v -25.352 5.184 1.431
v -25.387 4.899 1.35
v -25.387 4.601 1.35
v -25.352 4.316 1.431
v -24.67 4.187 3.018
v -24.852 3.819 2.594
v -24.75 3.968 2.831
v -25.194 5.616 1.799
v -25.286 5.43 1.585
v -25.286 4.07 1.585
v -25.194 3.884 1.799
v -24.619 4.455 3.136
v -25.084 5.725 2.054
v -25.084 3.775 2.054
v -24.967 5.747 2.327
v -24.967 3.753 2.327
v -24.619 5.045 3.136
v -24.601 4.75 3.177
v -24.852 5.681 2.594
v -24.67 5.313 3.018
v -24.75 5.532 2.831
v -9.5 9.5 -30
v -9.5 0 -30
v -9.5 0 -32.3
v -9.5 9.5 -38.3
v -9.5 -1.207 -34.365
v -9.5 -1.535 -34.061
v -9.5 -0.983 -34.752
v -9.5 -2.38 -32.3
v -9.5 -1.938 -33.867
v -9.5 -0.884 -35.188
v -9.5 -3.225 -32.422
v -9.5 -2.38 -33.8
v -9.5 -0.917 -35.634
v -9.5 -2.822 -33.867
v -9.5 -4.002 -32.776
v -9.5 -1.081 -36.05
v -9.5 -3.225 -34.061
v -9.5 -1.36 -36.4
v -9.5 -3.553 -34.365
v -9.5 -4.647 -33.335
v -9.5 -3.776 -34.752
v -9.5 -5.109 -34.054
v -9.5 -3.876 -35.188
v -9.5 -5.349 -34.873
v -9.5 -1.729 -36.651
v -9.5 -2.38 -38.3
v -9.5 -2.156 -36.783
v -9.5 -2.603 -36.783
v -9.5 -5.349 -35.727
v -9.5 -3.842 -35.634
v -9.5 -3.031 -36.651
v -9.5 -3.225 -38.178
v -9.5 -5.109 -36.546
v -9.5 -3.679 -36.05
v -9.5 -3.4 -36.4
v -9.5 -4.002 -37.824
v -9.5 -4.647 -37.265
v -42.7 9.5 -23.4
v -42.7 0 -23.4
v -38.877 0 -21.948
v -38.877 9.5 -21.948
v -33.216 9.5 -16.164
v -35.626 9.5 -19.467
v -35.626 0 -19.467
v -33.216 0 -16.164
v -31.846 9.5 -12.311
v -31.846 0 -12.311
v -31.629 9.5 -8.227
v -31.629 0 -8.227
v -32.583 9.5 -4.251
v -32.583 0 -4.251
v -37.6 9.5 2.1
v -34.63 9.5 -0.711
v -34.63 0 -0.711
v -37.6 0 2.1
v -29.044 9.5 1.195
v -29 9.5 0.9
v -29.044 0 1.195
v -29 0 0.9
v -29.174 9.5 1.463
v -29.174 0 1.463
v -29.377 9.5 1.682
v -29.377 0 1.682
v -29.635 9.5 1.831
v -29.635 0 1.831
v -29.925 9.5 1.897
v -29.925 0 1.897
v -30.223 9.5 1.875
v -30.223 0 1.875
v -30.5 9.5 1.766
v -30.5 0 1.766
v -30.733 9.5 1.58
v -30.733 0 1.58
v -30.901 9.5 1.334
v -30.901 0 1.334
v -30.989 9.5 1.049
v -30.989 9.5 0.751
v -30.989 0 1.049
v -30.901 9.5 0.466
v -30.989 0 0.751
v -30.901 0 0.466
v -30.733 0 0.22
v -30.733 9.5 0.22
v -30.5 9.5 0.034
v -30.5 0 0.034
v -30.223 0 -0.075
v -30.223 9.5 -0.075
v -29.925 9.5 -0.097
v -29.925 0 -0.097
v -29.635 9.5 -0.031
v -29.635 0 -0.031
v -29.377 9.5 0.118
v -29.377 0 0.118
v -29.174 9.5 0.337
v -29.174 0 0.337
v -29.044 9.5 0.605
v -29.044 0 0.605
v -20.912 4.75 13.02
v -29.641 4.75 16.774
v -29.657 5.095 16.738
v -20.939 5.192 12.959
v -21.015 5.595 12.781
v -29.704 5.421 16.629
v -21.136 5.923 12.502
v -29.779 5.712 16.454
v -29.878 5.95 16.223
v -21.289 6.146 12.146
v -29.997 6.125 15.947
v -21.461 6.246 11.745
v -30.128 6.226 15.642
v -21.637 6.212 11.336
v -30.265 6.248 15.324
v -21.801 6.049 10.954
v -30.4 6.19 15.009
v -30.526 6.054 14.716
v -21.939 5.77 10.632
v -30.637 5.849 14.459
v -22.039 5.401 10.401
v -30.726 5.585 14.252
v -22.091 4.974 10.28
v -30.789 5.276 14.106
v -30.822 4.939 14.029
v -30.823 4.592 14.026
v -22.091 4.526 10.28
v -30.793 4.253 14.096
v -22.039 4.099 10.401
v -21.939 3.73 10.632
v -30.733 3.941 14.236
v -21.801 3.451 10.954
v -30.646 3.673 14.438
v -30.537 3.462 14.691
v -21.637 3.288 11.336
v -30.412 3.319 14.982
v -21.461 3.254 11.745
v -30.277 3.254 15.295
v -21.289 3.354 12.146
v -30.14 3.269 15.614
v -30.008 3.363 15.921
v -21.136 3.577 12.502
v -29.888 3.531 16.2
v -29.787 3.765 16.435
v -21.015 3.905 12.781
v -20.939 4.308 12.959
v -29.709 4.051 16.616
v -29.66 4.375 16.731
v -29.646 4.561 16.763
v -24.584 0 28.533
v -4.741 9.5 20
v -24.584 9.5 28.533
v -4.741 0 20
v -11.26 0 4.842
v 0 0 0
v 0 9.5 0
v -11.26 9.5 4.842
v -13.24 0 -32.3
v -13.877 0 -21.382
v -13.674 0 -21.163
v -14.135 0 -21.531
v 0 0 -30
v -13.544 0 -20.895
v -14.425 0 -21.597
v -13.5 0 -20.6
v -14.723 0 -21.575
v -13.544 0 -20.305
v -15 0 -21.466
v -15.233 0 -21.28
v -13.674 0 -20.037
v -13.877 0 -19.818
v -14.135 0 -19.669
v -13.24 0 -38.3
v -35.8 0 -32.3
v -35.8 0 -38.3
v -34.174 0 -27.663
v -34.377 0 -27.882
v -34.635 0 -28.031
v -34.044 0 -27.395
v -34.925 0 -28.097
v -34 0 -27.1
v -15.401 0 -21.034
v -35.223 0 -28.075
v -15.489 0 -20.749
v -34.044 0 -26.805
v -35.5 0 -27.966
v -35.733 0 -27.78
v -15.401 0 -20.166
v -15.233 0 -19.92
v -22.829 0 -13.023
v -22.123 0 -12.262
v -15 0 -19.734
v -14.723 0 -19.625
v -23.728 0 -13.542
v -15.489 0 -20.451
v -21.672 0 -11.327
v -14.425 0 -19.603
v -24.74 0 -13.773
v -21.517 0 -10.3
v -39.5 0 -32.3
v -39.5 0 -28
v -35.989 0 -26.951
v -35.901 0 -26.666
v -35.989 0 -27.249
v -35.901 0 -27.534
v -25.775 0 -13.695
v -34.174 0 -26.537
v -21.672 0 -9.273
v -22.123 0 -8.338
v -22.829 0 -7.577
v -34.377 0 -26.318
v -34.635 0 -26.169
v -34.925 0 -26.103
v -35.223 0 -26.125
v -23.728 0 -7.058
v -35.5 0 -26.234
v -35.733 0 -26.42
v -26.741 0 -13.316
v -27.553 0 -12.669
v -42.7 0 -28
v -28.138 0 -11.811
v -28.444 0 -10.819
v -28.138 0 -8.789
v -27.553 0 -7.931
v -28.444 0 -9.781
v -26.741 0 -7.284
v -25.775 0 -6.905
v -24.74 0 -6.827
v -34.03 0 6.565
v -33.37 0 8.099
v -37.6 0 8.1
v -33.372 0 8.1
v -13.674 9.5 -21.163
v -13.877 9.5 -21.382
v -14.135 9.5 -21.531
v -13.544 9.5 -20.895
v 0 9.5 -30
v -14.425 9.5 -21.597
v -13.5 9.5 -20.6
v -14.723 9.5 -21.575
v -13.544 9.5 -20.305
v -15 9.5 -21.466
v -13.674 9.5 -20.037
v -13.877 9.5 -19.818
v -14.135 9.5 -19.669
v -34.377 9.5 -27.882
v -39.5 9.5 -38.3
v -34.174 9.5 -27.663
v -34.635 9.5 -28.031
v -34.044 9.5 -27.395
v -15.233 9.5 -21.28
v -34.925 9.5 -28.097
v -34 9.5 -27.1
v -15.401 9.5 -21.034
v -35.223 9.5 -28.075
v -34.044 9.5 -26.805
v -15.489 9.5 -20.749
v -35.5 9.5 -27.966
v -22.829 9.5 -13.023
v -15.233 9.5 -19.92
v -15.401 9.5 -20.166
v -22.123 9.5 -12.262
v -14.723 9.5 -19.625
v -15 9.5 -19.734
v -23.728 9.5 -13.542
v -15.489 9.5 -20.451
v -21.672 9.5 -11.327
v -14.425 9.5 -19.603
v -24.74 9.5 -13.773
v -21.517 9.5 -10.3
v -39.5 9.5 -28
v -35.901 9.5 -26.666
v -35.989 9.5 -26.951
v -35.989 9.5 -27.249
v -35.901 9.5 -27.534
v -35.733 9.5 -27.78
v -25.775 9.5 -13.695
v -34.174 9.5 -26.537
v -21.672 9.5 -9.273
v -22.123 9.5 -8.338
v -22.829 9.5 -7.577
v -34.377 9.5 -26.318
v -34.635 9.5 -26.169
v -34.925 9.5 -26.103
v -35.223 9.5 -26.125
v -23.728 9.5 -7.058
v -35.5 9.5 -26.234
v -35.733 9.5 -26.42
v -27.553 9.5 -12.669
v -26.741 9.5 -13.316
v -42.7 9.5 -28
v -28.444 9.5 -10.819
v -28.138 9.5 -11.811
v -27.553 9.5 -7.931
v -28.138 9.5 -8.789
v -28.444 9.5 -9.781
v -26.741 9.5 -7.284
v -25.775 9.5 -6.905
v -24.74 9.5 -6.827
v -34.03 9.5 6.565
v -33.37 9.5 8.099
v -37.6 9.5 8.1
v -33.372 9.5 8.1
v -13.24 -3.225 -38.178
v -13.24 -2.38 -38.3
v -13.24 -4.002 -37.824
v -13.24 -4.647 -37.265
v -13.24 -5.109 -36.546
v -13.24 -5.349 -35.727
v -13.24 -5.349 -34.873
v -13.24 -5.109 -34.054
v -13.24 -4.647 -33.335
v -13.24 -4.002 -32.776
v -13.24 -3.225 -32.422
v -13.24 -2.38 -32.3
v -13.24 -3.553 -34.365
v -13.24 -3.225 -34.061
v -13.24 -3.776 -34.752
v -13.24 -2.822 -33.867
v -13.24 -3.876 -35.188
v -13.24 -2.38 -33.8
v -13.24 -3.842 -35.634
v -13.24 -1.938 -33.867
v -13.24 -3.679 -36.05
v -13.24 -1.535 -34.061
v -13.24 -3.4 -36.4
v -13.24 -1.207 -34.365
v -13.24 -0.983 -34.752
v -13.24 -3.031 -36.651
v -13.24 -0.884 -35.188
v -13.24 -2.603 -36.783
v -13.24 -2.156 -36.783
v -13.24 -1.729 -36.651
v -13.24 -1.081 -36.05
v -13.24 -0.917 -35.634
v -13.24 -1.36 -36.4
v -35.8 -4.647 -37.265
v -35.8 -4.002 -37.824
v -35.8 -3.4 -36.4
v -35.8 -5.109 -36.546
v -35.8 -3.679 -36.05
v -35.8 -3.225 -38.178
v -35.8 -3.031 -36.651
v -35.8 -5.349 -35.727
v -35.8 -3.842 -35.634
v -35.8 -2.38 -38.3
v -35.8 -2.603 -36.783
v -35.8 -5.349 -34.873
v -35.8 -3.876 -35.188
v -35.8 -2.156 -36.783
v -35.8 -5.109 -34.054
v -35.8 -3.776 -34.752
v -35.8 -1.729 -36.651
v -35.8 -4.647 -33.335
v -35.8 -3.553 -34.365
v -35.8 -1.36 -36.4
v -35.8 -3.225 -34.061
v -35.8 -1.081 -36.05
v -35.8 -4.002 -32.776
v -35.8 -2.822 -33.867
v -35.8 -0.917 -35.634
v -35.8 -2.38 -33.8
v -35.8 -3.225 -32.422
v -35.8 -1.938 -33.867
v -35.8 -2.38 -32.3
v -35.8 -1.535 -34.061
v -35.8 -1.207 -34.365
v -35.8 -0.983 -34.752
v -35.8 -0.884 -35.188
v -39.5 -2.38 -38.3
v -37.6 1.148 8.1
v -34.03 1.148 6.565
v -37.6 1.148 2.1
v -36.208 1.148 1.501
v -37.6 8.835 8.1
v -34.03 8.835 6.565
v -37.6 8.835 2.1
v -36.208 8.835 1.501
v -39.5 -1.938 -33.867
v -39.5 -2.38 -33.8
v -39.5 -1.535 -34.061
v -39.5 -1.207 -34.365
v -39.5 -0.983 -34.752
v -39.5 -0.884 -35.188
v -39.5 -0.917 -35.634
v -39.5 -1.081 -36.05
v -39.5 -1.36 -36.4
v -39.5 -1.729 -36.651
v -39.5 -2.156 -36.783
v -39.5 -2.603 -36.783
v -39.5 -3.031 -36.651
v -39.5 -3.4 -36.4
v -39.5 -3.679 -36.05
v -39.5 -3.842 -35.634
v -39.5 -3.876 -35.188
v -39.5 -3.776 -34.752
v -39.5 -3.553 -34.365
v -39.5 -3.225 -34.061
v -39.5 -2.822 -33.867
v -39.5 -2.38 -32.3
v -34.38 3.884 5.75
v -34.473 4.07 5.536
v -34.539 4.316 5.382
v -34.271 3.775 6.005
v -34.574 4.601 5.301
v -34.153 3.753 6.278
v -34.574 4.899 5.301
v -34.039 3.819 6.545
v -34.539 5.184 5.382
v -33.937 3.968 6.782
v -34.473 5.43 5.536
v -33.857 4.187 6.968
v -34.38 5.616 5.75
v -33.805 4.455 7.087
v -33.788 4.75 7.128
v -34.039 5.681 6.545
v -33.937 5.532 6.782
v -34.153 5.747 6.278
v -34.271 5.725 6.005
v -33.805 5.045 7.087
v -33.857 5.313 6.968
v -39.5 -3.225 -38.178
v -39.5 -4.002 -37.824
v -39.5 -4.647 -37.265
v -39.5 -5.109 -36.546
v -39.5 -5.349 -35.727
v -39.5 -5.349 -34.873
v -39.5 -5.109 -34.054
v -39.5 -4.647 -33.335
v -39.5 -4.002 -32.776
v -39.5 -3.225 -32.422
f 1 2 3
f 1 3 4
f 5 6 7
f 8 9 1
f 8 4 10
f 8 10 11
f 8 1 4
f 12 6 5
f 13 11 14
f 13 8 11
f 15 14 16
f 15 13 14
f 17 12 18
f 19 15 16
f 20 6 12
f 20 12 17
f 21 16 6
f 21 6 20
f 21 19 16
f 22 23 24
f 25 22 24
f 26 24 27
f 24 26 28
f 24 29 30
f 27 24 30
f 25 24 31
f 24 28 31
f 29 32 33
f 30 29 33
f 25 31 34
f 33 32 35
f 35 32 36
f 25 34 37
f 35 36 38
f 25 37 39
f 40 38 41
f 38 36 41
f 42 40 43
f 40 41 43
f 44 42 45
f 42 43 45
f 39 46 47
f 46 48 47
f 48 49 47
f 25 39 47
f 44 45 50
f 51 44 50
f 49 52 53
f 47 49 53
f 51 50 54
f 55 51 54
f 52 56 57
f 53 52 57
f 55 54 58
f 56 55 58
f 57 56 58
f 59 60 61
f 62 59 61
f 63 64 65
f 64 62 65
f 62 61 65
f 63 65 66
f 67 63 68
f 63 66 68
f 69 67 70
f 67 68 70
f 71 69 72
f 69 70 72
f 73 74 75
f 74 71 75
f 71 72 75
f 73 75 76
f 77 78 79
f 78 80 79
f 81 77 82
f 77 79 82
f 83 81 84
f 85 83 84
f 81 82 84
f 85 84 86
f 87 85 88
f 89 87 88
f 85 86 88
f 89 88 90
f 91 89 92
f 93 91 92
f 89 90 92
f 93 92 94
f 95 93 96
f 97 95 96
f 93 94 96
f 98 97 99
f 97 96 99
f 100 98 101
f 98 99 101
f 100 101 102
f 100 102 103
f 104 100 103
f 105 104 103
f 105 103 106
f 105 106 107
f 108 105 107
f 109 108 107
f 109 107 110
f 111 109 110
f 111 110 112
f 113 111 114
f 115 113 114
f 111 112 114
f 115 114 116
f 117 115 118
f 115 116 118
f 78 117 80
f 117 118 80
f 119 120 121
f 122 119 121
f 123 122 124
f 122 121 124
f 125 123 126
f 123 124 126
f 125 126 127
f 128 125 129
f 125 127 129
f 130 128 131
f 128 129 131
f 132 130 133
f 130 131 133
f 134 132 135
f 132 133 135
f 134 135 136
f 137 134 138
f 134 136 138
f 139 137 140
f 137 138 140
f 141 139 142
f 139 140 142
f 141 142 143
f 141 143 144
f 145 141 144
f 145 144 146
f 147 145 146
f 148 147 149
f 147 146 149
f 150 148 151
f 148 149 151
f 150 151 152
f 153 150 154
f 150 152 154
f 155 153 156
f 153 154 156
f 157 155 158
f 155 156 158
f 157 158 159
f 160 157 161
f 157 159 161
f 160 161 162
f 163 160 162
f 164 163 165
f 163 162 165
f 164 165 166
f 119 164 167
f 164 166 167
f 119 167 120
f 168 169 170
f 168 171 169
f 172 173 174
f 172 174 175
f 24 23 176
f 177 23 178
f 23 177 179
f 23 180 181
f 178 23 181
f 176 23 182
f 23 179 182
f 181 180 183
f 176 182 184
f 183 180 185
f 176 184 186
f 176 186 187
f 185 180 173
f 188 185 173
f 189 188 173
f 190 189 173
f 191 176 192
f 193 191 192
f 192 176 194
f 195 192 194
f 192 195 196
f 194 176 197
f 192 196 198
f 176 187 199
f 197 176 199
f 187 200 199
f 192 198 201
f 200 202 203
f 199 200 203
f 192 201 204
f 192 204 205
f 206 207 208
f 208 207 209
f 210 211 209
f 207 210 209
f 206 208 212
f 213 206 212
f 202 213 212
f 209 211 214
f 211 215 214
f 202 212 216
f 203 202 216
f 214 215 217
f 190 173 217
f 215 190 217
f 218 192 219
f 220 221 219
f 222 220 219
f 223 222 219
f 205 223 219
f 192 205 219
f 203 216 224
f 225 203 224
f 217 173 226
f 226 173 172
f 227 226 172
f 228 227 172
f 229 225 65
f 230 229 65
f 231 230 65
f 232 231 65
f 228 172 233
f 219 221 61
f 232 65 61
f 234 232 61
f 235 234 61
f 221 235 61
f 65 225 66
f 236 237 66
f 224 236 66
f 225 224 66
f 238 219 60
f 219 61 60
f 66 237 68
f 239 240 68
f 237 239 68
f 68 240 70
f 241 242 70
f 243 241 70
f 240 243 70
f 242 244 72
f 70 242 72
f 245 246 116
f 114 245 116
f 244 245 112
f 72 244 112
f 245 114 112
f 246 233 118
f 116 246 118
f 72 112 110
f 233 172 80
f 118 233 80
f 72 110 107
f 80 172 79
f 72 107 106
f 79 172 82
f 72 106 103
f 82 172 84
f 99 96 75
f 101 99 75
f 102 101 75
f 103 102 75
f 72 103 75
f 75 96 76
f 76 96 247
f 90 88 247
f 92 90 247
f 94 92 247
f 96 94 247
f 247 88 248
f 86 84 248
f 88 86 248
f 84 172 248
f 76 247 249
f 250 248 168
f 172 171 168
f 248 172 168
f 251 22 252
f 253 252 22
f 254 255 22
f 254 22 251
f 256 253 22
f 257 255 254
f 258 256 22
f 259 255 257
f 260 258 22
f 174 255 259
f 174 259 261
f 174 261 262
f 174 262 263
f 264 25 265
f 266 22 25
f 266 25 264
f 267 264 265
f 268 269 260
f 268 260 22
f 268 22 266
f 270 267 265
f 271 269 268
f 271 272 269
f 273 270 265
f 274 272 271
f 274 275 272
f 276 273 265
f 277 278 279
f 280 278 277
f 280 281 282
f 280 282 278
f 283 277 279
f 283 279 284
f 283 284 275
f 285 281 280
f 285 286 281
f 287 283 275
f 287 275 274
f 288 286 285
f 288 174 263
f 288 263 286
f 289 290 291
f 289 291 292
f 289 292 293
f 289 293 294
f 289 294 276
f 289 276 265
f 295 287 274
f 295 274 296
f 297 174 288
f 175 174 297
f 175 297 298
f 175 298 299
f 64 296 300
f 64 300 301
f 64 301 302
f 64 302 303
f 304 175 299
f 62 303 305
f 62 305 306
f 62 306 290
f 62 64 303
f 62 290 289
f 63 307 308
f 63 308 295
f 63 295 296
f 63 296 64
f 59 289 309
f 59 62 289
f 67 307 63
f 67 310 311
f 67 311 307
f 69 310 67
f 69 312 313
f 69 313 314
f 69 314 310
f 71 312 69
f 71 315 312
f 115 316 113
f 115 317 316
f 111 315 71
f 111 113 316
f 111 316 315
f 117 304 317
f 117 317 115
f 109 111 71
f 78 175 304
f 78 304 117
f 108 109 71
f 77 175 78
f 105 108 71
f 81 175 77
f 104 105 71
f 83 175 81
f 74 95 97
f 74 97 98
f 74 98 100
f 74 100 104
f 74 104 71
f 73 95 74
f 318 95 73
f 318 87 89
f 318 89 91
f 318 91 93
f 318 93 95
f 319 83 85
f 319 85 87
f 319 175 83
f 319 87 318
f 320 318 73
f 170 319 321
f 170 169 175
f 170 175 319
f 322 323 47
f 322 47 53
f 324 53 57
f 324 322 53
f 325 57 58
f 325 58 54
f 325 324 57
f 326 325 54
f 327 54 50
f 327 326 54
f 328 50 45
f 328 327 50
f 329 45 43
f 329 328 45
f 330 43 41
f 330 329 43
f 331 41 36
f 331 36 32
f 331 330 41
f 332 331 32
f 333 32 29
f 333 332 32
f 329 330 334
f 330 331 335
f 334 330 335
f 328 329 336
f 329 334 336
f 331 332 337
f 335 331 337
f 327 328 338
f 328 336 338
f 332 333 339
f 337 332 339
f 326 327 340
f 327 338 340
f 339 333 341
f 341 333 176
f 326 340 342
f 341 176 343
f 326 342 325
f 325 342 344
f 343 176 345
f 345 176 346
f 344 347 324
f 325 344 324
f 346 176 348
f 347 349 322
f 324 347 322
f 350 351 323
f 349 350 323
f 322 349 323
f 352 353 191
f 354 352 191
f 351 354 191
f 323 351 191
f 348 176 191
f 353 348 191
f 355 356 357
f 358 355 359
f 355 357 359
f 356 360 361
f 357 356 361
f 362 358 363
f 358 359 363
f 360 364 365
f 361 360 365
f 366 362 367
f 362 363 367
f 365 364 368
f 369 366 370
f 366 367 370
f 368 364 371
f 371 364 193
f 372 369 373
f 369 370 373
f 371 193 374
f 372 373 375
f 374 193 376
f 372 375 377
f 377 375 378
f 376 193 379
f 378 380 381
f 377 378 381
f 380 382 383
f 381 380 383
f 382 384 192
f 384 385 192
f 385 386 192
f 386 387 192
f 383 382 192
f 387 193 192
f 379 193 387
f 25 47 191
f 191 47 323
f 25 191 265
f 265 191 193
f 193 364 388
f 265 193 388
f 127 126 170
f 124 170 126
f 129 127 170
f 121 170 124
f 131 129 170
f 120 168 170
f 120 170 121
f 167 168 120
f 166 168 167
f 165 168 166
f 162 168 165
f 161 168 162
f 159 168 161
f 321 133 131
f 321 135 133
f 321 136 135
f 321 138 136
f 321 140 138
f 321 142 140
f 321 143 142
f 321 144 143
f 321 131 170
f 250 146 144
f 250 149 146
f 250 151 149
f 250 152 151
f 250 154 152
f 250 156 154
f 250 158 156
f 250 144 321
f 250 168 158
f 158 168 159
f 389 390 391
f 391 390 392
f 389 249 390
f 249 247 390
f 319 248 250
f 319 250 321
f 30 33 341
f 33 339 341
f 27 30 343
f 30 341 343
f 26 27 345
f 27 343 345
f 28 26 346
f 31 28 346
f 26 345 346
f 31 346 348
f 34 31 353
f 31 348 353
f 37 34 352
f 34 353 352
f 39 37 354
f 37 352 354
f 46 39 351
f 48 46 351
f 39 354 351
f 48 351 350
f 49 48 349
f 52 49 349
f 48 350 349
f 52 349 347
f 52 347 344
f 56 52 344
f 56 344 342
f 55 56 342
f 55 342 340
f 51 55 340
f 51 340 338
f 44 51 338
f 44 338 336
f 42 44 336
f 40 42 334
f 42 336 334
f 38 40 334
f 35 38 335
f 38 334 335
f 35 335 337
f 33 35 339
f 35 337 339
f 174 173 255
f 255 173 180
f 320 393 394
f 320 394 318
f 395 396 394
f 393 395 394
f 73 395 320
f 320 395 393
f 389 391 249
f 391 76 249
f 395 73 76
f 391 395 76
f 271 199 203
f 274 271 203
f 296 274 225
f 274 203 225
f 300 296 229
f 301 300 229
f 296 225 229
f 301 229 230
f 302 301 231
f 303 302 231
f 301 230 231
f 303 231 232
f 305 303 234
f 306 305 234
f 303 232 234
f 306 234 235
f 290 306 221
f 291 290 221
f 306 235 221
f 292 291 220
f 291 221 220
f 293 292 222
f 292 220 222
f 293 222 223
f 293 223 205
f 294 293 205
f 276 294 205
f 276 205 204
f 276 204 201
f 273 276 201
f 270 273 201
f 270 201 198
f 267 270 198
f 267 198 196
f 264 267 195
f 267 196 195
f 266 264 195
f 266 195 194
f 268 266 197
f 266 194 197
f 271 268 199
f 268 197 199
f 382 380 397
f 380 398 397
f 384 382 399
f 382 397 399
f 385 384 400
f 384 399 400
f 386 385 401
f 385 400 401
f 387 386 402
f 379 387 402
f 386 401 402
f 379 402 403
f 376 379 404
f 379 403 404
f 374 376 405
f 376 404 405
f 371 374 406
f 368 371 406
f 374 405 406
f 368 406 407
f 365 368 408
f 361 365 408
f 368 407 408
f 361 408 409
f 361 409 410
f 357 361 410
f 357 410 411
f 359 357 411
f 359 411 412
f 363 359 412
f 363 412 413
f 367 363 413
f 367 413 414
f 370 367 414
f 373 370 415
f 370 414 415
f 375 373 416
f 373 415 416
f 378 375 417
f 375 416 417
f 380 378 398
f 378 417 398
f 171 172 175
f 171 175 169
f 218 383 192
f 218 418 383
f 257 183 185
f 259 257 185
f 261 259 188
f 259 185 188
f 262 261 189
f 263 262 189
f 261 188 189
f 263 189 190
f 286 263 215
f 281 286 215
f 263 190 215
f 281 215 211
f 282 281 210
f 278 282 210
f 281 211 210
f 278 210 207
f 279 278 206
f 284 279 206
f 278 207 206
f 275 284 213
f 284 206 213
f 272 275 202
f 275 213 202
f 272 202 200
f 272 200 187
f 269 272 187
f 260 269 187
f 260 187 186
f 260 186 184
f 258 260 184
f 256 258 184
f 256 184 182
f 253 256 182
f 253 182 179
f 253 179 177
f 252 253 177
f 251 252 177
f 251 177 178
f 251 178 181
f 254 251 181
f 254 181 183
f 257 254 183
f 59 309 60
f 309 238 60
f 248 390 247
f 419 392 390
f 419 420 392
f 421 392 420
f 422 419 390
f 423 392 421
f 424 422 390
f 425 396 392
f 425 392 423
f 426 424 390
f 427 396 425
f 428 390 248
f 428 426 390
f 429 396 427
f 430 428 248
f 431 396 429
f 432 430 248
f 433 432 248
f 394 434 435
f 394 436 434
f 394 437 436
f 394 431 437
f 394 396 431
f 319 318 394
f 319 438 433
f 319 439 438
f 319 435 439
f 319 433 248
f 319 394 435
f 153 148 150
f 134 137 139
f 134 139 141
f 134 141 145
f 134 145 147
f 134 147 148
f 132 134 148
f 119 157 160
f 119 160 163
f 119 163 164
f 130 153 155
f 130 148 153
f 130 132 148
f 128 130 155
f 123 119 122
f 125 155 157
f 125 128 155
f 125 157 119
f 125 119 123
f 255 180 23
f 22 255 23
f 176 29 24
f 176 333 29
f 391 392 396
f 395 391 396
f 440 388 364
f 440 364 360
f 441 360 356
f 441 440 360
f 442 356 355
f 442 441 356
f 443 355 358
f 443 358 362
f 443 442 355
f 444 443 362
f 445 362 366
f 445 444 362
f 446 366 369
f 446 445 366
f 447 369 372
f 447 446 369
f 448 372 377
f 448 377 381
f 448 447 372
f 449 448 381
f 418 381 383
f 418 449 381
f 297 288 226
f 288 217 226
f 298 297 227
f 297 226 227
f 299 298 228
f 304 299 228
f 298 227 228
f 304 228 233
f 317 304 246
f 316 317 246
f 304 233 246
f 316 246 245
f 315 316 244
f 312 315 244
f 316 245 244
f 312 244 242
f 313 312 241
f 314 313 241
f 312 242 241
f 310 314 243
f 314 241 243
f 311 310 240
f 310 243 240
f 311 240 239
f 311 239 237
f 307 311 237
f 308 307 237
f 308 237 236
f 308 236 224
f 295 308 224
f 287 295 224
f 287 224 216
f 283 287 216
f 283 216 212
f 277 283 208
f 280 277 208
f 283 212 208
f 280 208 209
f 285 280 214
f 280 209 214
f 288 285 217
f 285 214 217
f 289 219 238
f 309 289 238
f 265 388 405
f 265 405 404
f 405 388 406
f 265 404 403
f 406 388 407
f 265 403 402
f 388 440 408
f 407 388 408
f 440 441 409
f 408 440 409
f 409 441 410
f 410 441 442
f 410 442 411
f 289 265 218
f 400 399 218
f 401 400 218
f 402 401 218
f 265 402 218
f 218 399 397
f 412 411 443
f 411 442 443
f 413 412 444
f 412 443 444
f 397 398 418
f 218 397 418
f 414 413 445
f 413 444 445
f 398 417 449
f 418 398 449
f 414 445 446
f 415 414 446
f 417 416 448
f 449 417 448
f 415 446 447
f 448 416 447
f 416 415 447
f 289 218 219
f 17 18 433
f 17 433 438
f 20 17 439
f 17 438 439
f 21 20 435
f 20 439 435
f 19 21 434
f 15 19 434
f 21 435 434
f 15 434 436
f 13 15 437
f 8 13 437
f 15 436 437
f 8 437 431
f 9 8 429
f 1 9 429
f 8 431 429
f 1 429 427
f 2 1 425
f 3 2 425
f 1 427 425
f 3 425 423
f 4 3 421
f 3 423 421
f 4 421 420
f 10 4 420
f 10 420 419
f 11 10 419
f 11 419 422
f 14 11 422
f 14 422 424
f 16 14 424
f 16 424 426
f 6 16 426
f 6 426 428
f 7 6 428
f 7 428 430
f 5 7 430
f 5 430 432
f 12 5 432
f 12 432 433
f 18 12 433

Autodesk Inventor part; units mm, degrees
ref_plane "YZ Plane" through (0, 0, 0) normal (1, 0, 0) x (0, 1, 0)
ref_plane "XZ Plane" through (0, 0, 0) normal (0, 1, 0) x (-1, 0, 0)
ref_plane "XY Plane" through (0, 0, 0) normal (0, 0, 1) x (1, 0, 0)
sketch "Skizze1" plane through (0, 0, 0) normal (0, 1, 0) x (-1, 0, 0)
  line L0 (0, 0) -> (0, -30)
  line L1 (0, -30) -> (9.5, -30)
  line L2 (9.5, -30) -> (9.5, -38.3)
  line L3 (9.5, -38.3) -> (39.5, -38.3)
  line L4 (39.5, -38.3) -> (39.5, -28)
  line L5 (39.5, -28) -> (42.7, -28)
  line L6 (42.7, -28) -> (42.7, -23.4)
  arc A0 (37.6, 2.1) -> (42.7, -23.4) centre (45.7856, -9.5229) ccw
  line L7 (0, 0) -> (11.2599, 4.8422)
  line L8 (11.2599, 4.8422) -> (4.7414, 20)
  line L9 (4.7414, 20) -> (24.5844, 28.5332)
  line L10 (24.5844, 28.5332) -> (33.3715, 8.1)
  line L11 (62.1927, -61.79) -> (-17.9865, -61.79) construction
  line L12 (-17.9865, -61.79) -> (-17.9865, 45.1157) construction
  line L13 (-17.9865, 45.1157) -> (62.1927, 45.1157) construction
  line L14 (62.1927, 45.1157) -> (62.1927, -61.79) construction
  line L15 (-1.7899, 2.1) -> (7.9361, 5.9872)
  line L16 (37.6, 2.1) -> (37.6, 8.1)
  line L17 (37.6, 8.1) -> (33.3715, 8.1)
  dimension "d0" = 30
  dimension "d1" = 9.5
  dimension "d2" = 8.3
  dimension "d3" = 30
  dimension "d4" = 10.3
  dimension "d5" = 3.2
  dimension "d6" = 4.6
  dimension "d7" = 5.1
  dimension "d8" = 25.5
  dimension "d10" = 90
  dimension "d11" = 20
  dimension "d12" = 16.5
  dimension "d13" = 21.6
  dimension "d14" = 90
  dimension "d30" = 90
  dimension "d34" = 6
extrude "Extrusion1" add sketch "Skizze1" along normal blind 9.5
sketch "Skizze2" plane through (-24.5844, 0, 28.5332) normal (-0.9187, 0, 0.3951) x (0.3951, 0, 0.9187)
  line L0 (-22.2425, 0) -> (0, 0) projected
  line L1 (0, 0) -> (0, 9.5) projected
  line L2 (-22.2425, 9.5) -> (0, 9.5) projected
  line L3 (-22.2425, 0) -> (-22.2425, 9.5) projected
  circle A0 centre (-14.3, 4.75) radius 1.5
  point P0 (-16.5, 0)
  dimension "d38" = 14.3
  dimension "d39" = 3
extrude "Extrusion2" cut sketch "Skizze2" against normal blind 9.5 contours A0
sketch "Skizze3" plane through (-39.5, 0, -38.3) normal (-1, 0, 0) x (0, 0, 1)
  line L0 (0, 0) -> (10.3, 0) projected
  line L1 (10.3, 0) -> (10.3, 9.5) projected
  line L2 (0, 9.5) -> (10.3, 9.5) projected
  line L3 (0, 0) -> (0, 9.5) projected
  circle A0 centre (3, -2.3798) radius 1.5
  circle A1 centre (3, -2.3798) radius 3
  line L4 (0, 0) -> (0, 9.5) projected
  line L5 (0, -2.3798) -> (0, 0.1566)
  line L6 (6, -2.3798) -> (6, 0)
  line L7 (8.3, 0) -> (0, 0) projected
  point P0 (38.3, 0)
  dimension "d42" = 3
  dimension "d43" = 6
extrude "Extrusion3" add sketch "Skizze3" against normal up to surface (30 mm away) contours L6 A1 L0 | A1 L0 | A1 L5 L0 picked at (2.9397, -0.2969)
sketch "Skizze4" plane through (0, 0, 0) normal (0, -1, 0) x (1, 0, 0)
  line L0 (-39.5, -32.3) -> (-9.5, -32.3) projected
  line L1 (-9.5, -30) -> (-9.5, -32.3) projected
  line L2 (0, -30) -> (-9.5, -30) projected
  line L3 (0, 0) -> (0, -30) projected
  line L4 (-11.2599, 4.8422) -> (0, 0) projected
  line L5 (-4.7414, 20) -> (-11.2599, 4.8422) projected
  line L6 (-24.5844, 28.5332) -> (-4.7414, 20) projected
  line L7 (-33.3715, 8.1) -> (-24.5844, 28.5332) projected
  line L8 (-37.6, 8.1) -> (-33.3715, 8.1) projected
  line L9 (-37.6, 2.1) -> (-37.6, 8.1) projected
  arc A0 (-42.7, -23.4) -> (-37.6, 2.1) centre (-45.7856, -9.5229) ccw projected
  line L10 (-42.7, -28) -> (-42.7, -23.4) projected
  line L11 (-39.5, -28) -> (-42.7, -28) projected
  line L12 (-39.5, -32.3) -> (-39.5, -28) projected
  circle A1 centre (-25, -10.3) radius 3.4826
  line L13 (-39.5, -38.3) -> (-9.5, -38.3) projected
  dimension "d46" = 25
  dimension "d47" = 28
extrude "Extrusion4" cut sketch "Skizze4" against normal blind 10 contours A1
sketch "Skizze5" plane through (0, 0, 0) normal (0, -1, 0) x (1, 0, 0)
  line L0 (-9.5, -38.3) -> (-9.5, -32.3) projected
  line L1 (-39.5, -32.3) -> (-9.5, -32.3) projected
  line L2 (-39.5, -38.3) -> (-39.5, -32.3) projected
  line L3 (-39.5, -38.3) -> (-9.5, -38.3) projected
  line L4 (-9.5, -38.3) -> (-39.5, -38.3) projected
  line L5 (-35.8, -32.3) -> (-13.24, -32.3)
  line L6 (-13.24, -32.3) -> (-13.24, -38.3)
  line L7 (-13.24, -38.3) -> (-35.8, -38.3)
  line L8 (-35.8, -38.3) -> (-35.8, -32.3)
  line L9 (-13.24, -32.3) -> (-35.8, -32.3)
  line L10 (-35.8, -32.3) -> (-35.8, -38.3)
  line L11 (-35.8, -38.3) -> (-13.24, -38.3)
  line L12 (-13.24, -38.3) -> (-13.24, -32.3)
  point P0 (0, 0)
  dimension "d50" = 3.74
  dimension "d51" = 3.7
extrude "Extrusion5" cut sketch "Skizze5" along normal blind 10 contours L3 L8 L1 L6
sketch "Skizze6" plane through (0, 0, 0) normal (0, -1, 0) x (1, 0, 0)
  arc A0 (-36.7, -25.4555) -> (-37.7, -26.4555) centre (-36.7, -26.4555) ccw projected
  line L0 (-37.7, -26.4555) -> (-37.7, -29.6) projected
  line L1 (-37.7, -29.6) -> (-12, -29.6) projected
  line L2 (-12, -29.6) -> (-12, -20.0723) projected
  arc A1 (-12, -20.0723) -> (-13, -19.0723) centre (-13, -20.0723) ccw projected
  line L3 (-13, -19.0723) -> (-14.8624, -19.0723) projected
  arc A2 (-15.8624, -18.0723) -> (-14.8624, -19.0723) centre (-14.8624, -18.0723) ccw projected
  line L4 (-15.8624, -18.0723) -> (-15.8624, 0.4) projected
  line L5 (-15.8624, 0.4) -> (-27.397, 0.4) projected
  arc A3 (-28.397, 1.4) -> (-27.397, 0.4) centre (-27.397, 1.4) ccw projected
  line L6 (-28.397, 1.4) -> (-28.397, 2.4) projected
  arc A4 (-28.397, 2.4) -> (-29.397, 3.4) centre (-29.397, 2.4) ccw projected
  line L7 (-29.397, 3.4) -> (-31.9624, 3.4) projected
  arc A5 (-31.9624, 3.4) -> (-32.9624, 2.4) centre (-31.9624, 2.4) ccw projected
  line L8 (-32.9624, 2.4) -> (-32.9624, -24.4555) projected
  arc A6 (-33.9624, -25.4555) -> (-32.9624, -24.4555) centre (-33.9624, -24.4555) ccw projected
  line L9 (-33.9624, -25.4555) -> (-36.7, -25.4555) projected
  line L10 (-31, -17.1) -> (-31, -1.6) projected
  line L11 (-31, -1.6) -> (-17.5, -1.6) projected
  line L12 (-17.5, -1.6) -> (-17.5, -17.1) projected
  line L13 (-17.5, -17.1) -> (-31, -17.1) projected
  circle A7 centre (-35, -27.1) radius 1 projected
  circle A8 centre (-14.5, -20.6) radius 1 projected
  circle A9 centre (-30, 0.9) radius 1 projected
  line L14 (-42.7, -28) -> (-42.7, -23.4) projected
  point P0 (0, 0)
  dimension "d56" = 7.7
extrude "Extrusion6" cut sketch "Skizze6" against normal through all contours A7 | A8 | A9
sketch "Skizze7" plane through (-24.5844, 0, 28.5332) normal (-0.9187, 0, 0.3951) x (0.3951, 0, 0.9187)
  circle A0 centre (-14.3, 4.75) radius 1.5 projected
  line L0 (-22.2425, 0) -> (0, 0) projected
  line L1 (0, 0) -> (0, 9.5) projected
  line L2 (-22.2425, 9.5) -> (0, 9.5) projected
  line L3 (-22.2425, 0) -> (-22.2425, 9.5) projected
  line L4 (-29.4249, 0) -> (-23.913, 0) projected
  line L5 (-23.913, 0) -> (-23.913, 9.5) projected
  line L6 (-29.4249, 9.5) -> (-23.913, 9.5) projected
  line L7 (-29.4249, 0) -> (-29.4249, 9.5) projected
  line L8 (-23.913, 0) -> (-23.913, 9.5) projected
  line L9 (-23.913, 0) -> (-22.2425, 0) projected
  line L10 (-22.2425, 0) -> (-22.2425, 9.5) projected
  line L11 (-23.913, 9.5) -> (-22.2425, 9.5) projected
  line L12 (-23.913, 0) -> (-23.913, 9.5) projected
  line L13 (-22.2425, 0) -> (-22.2425, 9.5) projected
  line L14 (-29.4249, 0) -> (-29.4249, 9.5) projected
  line L15 (-22.2425, 1.1485) -> (-29.4249, 1.1485)
  line L16 (-29.4249, 1.1485) -> (-29.4249, 8.8348)
  line L17 (-29.4249, 8.8348) -> (-22.2425, 8.8348)
  line L18 (-22.2425, 8.8348) -> (-22.2425, 1.1485)
  point P0 (-16.5, 0)
  point P1 (-23.913, 8.8348)
  point P2 (-29.4249, 8.8348)
  point P3 (-23.913, 1.1485)
  point P4 (-23.913, 0)
  point P5 (-23.913, 9.5)
extrude "Extrusion7" cut sketch "Skizze7" along normal blind 10 contours L9 L5 L15 L3 | L15 L5 L17 L3 | L17 L5 L11 L3 | L15 L7 L17 L5
sketch "Skizze8" plane through (-24.5844, 0, 28.5332) normal (-0.9187, 0, 0.3951) x (0.3951, 0, 0.9187)
  line L0 (-16.5, 0) -> (-16.5, 9.5) projected
  circle A0 centre (-14.3, 4.75) radius 1.5 projected
  line L1 (0, 0) -> (-23.913, 0) projected
  line L2 (0, 0) -> (0, 9.5) projected
  line L3 (-23.913, 9.5) -> (0, 9.5) projected
  line L4 (-23.913, 9.5) -> (-23.913, 8.8348) projected
  line L5 (-23.913, 8.8348) -> (-29.4249, 8.8348) projected
  line L6 (-29.4249, 8.8348) -> (-29.4249, 1.1485) projected
  line L7 (-29.4249, 1.1485) -> (-23.913, 1.1485) projected
  line L8 (-23.913, 1.1485) -> (-23.913, 0) projected
  circle A1 centre (-24.3, 4.75) radius 1
  dimension "d59" = 2
  dimension "d60" = 10
extrude "Extrusion8" cut sketch "Skizze8" against normal blind 10 contours A1
properties part number "00_KES400A_base"
